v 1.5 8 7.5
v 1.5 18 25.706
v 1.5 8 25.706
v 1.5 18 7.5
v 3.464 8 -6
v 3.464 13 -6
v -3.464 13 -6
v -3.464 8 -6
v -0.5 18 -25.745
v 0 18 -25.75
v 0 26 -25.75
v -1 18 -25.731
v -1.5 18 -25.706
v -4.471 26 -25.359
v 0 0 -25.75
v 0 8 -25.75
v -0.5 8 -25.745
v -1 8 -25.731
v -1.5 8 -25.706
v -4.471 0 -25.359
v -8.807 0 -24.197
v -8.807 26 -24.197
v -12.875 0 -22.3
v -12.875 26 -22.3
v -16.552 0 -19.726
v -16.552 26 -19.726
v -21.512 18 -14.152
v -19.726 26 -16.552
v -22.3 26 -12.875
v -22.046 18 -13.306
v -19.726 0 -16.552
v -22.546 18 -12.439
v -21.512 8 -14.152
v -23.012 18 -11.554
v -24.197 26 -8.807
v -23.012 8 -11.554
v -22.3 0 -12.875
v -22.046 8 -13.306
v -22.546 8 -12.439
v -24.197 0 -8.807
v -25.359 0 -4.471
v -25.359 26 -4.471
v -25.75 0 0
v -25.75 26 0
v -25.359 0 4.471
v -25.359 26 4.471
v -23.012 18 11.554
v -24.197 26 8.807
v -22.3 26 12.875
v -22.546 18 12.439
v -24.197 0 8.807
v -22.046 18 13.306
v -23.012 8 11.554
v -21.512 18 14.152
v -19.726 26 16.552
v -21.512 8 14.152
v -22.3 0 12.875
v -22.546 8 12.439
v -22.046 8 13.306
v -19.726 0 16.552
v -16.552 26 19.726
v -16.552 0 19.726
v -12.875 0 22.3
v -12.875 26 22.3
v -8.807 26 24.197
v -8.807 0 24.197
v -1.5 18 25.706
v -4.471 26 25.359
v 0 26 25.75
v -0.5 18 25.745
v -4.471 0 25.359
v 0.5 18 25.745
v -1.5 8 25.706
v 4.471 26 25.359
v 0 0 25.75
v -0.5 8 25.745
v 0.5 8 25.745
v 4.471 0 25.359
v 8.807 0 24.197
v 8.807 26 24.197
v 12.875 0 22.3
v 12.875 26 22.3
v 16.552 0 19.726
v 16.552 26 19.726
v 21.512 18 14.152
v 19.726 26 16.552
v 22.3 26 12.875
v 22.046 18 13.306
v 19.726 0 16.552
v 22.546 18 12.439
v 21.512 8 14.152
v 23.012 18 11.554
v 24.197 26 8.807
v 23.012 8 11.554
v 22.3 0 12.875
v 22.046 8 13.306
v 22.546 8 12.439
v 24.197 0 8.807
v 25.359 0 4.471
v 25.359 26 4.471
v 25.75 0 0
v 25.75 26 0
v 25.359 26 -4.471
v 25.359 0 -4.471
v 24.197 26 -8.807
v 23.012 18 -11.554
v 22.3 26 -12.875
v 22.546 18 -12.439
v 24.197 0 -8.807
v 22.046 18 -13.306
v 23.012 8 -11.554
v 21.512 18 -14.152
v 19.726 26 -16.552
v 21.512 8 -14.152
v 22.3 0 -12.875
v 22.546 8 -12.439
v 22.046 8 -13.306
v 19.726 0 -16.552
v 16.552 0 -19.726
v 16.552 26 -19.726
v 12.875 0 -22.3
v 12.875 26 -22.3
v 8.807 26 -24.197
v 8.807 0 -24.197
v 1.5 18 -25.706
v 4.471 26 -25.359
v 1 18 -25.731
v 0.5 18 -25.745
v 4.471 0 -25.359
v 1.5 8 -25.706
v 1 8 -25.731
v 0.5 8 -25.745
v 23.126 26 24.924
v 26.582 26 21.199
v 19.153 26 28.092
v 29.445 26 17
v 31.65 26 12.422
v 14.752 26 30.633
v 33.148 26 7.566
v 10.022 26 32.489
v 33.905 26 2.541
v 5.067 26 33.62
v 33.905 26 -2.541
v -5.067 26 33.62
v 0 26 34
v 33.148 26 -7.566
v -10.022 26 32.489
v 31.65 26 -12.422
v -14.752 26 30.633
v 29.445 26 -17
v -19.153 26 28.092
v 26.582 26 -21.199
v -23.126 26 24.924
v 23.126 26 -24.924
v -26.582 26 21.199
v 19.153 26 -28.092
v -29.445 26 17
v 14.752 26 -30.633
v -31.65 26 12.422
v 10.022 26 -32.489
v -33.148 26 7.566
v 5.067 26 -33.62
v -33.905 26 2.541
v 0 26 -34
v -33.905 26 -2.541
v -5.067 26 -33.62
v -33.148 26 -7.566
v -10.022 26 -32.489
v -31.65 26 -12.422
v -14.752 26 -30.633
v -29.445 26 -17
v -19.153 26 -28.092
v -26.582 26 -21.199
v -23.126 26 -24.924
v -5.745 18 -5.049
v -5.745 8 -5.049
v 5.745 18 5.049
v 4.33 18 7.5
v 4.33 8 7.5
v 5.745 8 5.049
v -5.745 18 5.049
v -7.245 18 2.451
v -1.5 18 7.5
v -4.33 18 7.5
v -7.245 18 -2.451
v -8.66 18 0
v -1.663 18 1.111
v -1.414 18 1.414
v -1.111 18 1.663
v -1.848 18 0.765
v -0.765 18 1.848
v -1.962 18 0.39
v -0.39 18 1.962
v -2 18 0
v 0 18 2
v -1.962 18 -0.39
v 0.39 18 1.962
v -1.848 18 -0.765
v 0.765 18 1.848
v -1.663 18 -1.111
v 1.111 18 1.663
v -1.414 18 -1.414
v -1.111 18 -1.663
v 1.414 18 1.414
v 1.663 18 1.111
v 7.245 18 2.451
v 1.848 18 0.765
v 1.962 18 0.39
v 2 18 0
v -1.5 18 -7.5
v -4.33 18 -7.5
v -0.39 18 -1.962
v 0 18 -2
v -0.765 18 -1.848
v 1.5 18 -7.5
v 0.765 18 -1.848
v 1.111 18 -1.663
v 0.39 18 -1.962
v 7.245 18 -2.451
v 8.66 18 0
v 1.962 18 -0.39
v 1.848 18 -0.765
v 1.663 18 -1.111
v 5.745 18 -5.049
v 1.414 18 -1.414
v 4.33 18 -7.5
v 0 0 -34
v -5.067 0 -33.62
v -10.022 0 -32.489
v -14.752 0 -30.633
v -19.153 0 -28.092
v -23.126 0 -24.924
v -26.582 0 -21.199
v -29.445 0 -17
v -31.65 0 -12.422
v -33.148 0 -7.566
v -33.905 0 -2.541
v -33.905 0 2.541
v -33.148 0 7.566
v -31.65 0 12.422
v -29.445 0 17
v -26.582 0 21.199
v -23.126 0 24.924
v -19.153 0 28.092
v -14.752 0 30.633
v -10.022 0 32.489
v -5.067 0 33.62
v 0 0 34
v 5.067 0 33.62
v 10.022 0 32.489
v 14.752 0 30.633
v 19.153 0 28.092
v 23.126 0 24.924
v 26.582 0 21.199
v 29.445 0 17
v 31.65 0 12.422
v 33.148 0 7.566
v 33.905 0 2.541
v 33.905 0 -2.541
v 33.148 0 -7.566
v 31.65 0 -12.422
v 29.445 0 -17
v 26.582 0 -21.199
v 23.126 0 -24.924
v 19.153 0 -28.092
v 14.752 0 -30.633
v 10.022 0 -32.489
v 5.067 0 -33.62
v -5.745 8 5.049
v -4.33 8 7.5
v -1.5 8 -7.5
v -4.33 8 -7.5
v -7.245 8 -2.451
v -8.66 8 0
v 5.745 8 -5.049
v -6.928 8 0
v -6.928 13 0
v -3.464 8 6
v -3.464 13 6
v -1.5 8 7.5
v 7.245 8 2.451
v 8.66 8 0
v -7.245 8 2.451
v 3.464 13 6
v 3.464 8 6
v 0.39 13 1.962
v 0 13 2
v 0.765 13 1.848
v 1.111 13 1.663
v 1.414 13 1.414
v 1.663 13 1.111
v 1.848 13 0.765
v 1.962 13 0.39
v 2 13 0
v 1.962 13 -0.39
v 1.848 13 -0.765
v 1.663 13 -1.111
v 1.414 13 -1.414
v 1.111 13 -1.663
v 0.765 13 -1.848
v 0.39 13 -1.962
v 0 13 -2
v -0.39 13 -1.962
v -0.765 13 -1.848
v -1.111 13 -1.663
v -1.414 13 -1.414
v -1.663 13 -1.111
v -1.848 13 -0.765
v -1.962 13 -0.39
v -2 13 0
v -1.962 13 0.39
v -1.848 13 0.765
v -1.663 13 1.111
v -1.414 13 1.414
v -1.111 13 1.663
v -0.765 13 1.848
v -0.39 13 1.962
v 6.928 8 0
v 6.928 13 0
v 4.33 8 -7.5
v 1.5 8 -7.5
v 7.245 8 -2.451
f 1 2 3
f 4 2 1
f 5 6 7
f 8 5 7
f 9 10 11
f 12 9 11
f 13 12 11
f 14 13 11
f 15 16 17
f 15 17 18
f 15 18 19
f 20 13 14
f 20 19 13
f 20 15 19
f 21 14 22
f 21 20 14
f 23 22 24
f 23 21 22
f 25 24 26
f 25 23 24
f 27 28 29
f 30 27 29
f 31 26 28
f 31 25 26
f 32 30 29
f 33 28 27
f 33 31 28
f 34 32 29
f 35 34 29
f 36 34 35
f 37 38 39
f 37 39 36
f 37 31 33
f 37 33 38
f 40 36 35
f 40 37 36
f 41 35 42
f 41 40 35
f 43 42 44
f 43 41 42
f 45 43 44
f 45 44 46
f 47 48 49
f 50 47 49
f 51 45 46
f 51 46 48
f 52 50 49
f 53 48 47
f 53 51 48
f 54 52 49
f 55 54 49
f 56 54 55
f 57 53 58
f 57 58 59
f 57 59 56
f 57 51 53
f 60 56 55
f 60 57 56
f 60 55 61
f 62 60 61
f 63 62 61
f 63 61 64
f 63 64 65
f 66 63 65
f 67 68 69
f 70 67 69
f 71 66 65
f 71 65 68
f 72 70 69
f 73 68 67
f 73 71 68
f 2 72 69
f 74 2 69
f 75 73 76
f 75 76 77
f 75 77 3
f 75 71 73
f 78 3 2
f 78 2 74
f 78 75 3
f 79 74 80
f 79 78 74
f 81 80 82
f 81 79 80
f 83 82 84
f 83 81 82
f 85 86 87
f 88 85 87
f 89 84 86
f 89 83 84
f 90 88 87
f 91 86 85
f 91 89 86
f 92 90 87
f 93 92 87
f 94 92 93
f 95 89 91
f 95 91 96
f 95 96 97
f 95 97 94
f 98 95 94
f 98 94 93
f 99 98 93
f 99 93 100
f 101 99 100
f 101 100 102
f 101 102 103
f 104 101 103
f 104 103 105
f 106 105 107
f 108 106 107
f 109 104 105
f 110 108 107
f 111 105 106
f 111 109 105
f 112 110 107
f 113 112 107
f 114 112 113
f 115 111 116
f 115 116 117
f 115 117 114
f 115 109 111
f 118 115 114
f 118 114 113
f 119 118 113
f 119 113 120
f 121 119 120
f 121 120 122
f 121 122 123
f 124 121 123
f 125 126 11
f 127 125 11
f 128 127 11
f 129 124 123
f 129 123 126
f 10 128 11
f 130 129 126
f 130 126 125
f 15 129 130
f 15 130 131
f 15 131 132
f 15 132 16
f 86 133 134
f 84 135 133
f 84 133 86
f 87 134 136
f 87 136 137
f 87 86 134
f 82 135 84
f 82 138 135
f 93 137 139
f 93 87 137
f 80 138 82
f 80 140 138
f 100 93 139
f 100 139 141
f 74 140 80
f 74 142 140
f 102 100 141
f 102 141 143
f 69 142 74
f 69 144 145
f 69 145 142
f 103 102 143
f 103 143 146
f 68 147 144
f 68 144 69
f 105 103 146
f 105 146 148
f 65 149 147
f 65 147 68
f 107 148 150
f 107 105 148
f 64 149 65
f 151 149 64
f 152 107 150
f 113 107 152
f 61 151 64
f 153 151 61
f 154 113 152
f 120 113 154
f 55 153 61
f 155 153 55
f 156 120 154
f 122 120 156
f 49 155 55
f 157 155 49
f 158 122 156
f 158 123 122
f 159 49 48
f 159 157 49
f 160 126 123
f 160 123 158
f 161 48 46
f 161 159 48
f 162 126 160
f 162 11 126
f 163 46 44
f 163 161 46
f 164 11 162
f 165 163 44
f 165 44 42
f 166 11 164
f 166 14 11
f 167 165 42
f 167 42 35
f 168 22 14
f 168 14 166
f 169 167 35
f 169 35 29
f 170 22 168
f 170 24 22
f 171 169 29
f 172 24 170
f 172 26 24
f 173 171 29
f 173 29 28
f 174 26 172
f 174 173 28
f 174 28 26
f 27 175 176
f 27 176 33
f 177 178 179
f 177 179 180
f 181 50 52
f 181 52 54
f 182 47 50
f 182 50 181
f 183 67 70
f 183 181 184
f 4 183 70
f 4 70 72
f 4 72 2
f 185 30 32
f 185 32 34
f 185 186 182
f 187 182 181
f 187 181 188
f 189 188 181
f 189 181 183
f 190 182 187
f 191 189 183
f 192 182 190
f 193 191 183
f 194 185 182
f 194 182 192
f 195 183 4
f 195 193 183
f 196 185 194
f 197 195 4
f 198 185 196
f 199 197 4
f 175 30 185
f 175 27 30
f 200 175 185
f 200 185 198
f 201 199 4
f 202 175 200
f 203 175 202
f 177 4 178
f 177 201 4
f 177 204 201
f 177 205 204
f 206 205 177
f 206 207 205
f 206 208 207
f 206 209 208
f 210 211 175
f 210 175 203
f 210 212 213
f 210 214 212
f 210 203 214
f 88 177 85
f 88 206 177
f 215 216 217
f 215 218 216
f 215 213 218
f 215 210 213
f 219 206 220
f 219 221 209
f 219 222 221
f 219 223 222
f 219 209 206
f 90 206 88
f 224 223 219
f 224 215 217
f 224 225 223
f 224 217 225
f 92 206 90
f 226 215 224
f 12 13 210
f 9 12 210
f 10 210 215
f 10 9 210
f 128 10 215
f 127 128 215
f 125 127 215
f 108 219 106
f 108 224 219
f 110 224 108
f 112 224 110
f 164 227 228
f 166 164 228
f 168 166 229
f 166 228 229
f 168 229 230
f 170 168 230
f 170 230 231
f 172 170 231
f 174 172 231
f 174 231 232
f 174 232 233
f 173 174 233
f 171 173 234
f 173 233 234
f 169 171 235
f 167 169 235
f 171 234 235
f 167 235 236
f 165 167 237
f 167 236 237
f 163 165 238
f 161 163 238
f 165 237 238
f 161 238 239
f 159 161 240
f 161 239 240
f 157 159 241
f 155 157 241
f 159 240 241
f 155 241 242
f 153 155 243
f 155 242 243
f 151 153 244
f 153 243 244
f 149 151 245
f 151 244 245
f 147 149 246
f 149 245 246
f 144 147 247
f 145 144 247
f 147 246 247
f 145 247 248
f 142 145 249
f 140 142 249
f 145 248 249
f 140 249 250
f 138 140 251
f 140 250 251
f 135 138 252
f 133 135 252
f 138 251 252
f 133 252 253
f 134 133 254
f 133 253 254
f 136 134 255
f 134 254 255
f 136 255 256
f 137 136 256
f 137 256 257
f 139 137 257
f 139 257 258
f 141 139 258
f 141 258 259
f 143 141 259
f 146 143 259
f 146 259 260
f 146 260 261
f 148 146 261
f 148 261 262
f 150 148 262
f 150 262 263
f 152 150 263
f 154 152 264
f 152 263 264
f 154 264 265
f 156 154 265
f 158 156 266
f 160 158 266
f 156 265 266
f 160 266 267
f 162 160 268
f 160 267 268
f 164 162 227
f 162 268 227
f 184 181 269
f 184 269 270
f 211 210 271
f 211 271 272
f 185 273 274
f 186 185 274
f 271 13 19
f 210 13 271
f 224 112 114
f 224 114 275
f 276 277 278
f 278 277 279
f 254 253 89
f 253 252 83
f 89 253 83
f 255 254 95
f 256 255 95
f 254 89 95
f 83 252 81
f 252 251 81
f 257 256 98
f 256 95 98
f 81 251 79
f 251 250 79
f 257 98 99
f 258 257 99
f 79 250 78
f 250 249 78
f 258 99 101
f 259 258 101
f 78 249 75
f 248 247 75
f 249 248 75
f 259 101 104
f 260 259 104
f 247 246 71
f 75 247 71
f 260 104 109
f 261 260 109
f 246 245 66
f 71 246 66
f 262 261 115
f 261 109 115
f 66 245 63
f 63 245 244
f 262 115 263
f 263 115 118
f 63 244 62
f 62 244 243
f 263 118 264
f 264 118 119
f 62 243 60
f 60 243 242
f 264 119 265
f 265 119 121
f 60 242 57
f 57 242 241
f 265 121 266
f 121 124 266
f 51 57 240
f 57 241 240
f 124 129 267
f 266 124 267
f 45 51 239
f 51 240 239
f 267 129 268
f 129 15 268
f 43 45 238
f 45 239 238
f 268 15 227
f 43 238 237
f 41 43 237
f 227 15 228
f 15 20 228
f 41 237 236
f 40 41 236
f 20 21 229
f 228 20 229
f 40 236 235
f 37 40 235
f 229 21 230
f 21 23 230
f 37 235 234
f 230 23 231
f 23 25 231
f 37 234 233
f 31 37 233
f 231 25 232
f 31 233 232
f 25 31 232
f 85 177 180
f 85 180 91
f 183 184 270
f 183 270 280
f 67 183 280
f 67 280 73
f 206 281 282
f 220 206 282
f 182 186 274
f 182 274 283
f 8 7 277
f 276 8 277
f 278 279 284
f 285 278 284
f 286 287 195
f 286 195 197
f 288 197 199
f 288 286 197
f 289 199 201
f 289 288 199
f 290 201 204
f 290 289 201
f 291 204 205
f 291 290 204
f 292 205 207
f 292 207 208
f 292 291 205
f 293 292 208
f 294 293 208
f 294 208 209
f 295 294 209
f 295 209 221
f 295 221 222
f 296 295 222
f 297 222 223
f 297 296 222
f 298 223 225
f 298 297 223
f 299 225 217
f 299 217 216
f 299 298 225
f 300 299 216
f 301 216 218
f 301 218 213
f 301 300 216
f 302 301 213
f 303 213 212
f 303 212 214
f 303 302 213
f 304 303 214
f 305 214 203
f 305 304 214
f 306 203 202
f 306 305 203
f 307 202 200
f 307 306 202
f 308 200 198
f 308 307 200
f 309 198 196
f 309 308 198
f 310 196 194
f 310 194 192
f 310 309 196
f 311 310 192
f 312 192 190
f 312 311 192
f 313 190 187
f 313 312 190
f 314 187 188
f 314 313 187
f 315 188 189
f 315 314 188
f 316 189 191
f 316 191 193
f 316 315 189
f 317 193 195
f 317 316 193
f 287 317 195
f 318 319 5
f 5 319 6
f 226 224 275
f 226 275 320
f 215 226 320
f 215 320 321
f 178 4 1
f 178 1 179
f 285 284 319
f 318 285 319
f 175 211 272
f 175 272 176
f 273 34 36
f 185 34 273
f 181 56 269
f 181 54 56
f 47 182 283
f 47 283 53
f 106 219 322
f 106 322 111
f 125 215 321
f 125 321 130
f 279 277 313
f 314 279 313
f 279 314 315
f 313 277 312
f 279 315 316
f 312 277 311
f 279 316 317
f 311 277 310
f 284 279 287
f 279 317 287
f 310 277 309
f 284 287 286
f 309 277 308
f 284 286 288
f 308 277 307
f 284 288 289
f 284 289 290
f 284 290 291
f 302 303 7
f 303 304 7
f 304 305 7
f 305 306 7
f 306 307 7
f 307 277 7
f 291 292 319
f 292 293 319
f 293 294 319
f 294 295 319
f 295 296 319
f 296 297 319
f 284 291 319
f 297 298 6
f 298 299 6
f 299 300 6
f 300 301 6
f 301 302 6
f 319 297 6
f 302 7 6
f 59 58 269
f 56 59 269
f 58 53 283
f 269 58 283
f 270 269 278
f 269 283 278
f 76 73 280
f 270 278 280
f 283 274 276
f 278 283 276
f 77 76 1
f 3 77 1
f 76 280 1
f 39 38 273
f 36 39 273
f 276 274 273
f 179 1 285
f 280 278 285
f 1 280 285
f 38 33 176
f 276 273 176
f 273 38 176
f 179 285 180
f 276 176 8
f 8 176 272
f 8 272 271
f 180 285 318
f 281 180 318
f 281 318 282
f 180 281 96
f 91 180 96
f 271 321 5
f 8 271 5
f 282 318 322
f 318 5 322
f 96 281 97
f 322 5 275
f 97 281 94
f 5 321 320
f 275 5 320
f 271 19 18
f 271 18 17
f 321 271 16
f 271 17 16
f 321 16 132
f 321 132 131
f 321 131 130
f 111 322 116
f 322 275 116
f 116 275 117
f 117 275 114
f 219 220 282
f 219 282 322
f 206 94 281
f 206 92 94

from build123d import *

# Parameters (mm, degrees)
SKETCH_1_R      = 34
SKETCH_1_R_2    = 25.75
EXTRUDE_1_DEPTH = 26
EXTRUDE_2_DEPTH = 5
SKETCH_2_4_R    = 2
EXTRUDE_3_DEPTH = 5


with BuildPart() as part:
    # 草图1 → 凸台-拉伸1 (new body)
    with BuildSketch(Plane(origin=(0, 0, 0), x_dir=(1, 0, 0), z_dir=(0, 1, 0))):
        Circle(SKETCH_1_R)
        Circle(SKETCH_1_R_2, mode=Mode.SUBTRACT)
    extrude(amount=EXTRUDE_1_DEPTH)

    # 草图2 → 凸台-拉伸2 (add, symmetric)
    with BuildSketch(Plane(origin=(0, 13, 0), x_dir=(1, 0, 0), z_dir=(0, 1, 0))):
        with BuildLine():
            Line((7.245190528, -2.450961894), (8.660254038, 0))
            Line((8.660254038, 0), (7.245190528, 2.450961894))
            Line((7.245190528, 2.450961894), (23.012285934, 11.554098671))
            ThreePointArc((23.012285934, 11.554098671), (22.300154147, 12.875), (21.512285934, 14.152174882))
            Line((21.512285934, 14.152174882), (5.745190528, 5.049038106))
            Line((5.745190528, 5.049038106), (4.330127019, 7.5))
            Line((4.330127019, 7.5), (1.5, 7.5))
            Line((1.5, 7.5), (1.5, 25.706273553))
            ThreePointArc((1.5, 25.706273553), (0, 25.75), (-1.5, 25.706273553))
            Line((-1.5, 25.706273553), (-1.5, 7.5))
            Line((-1.5, 7.5), (-4.330127019, 7.5))
            Line((-4.330127019, 7.5), (-5.745190528, 5.049038106))
            Line((-5.745190528, 5.049038106), (-21.512285934, 14.152174882))
            ThreePointArc((-21.512285934, 14.152174882), (-22.300154147, 12.875), (-23.012285934, 11.554098671))
            Line((-23.012285934, 11.554098671), (-7.245190528, 2.450961894))
            Line((-7.245190528, 2.450961894), (-8.660254038, 0))
            Line((-8.660254038, 0), (-7.245190528, -2.450961894))
            Line((-7.245190528, -2.450961894), (-23.012285934, -11.554098671))
            ThreePointArc((-23.012285934, -11.554098671), (-22.300154147, -12.875), (-21.512285934, -14.152174882))
            Line((-21.512285934, -14.152174882), (-5.745190528, -5.049038106))
            Line((-5.745190528, -5.049038106), (-4.330127019, -7.5))
            Line((-4.330127019, -7.5), (-1.5, -7.5))
            Line((-1.5, -7.5), (-1.5, -25.706273553))
            ThreePointArc((-1.5, -25.706273553), (0, -25.75), (1.5, -25.706273553))
            Line((1.5, -25.706273553), (1.5, -7.5))
            Line((1.5, -7.5), (4.330127019, -7.5))
            Line((4.330127019, -7.5), (5.745190528, -5.049038106))
            Line((5.745190528, -5.049038106), (21.512285934, -14.152174882))
            ThreePointArc((21.512285934, -14.152174882), (22.300154147, -12.875), (23.012285934, -11.554098671))
            Line((23.012285934, -11.554098671), (7.245190528, -2.450961894))
        make_face()
        Polygon((3.464101615, 6), (6.92820323, 0), (3.464101615, -6), (-3.464101615, -6), (-6.92820323, 0), (-3.464101615, 6), align=None, mode=Mode.SUBTRACT)
    extrude(amount=EXTRUDE_2_DEPTH, both=True)

    # 草图2<4> → 凸台-拉伸3 (add)
    with BuildSketch(Plane(origin=(0, 13, 0), x_dir=(1, 0, 0), z_dir=(0, 1, 0))):
        Polygon((3.464101615, -6), (6.92820323, 0), (3.464101615, 6), (-3.464101615, 6), (-6.92820323, 0), (-3.464101615, -6), align=None)
        Circle(SKETCH_2_4_R, mode=Mode.SUBTRACT)
    extrude(amount=EXTRUDE_3_DEPTH)


solid = part.part
